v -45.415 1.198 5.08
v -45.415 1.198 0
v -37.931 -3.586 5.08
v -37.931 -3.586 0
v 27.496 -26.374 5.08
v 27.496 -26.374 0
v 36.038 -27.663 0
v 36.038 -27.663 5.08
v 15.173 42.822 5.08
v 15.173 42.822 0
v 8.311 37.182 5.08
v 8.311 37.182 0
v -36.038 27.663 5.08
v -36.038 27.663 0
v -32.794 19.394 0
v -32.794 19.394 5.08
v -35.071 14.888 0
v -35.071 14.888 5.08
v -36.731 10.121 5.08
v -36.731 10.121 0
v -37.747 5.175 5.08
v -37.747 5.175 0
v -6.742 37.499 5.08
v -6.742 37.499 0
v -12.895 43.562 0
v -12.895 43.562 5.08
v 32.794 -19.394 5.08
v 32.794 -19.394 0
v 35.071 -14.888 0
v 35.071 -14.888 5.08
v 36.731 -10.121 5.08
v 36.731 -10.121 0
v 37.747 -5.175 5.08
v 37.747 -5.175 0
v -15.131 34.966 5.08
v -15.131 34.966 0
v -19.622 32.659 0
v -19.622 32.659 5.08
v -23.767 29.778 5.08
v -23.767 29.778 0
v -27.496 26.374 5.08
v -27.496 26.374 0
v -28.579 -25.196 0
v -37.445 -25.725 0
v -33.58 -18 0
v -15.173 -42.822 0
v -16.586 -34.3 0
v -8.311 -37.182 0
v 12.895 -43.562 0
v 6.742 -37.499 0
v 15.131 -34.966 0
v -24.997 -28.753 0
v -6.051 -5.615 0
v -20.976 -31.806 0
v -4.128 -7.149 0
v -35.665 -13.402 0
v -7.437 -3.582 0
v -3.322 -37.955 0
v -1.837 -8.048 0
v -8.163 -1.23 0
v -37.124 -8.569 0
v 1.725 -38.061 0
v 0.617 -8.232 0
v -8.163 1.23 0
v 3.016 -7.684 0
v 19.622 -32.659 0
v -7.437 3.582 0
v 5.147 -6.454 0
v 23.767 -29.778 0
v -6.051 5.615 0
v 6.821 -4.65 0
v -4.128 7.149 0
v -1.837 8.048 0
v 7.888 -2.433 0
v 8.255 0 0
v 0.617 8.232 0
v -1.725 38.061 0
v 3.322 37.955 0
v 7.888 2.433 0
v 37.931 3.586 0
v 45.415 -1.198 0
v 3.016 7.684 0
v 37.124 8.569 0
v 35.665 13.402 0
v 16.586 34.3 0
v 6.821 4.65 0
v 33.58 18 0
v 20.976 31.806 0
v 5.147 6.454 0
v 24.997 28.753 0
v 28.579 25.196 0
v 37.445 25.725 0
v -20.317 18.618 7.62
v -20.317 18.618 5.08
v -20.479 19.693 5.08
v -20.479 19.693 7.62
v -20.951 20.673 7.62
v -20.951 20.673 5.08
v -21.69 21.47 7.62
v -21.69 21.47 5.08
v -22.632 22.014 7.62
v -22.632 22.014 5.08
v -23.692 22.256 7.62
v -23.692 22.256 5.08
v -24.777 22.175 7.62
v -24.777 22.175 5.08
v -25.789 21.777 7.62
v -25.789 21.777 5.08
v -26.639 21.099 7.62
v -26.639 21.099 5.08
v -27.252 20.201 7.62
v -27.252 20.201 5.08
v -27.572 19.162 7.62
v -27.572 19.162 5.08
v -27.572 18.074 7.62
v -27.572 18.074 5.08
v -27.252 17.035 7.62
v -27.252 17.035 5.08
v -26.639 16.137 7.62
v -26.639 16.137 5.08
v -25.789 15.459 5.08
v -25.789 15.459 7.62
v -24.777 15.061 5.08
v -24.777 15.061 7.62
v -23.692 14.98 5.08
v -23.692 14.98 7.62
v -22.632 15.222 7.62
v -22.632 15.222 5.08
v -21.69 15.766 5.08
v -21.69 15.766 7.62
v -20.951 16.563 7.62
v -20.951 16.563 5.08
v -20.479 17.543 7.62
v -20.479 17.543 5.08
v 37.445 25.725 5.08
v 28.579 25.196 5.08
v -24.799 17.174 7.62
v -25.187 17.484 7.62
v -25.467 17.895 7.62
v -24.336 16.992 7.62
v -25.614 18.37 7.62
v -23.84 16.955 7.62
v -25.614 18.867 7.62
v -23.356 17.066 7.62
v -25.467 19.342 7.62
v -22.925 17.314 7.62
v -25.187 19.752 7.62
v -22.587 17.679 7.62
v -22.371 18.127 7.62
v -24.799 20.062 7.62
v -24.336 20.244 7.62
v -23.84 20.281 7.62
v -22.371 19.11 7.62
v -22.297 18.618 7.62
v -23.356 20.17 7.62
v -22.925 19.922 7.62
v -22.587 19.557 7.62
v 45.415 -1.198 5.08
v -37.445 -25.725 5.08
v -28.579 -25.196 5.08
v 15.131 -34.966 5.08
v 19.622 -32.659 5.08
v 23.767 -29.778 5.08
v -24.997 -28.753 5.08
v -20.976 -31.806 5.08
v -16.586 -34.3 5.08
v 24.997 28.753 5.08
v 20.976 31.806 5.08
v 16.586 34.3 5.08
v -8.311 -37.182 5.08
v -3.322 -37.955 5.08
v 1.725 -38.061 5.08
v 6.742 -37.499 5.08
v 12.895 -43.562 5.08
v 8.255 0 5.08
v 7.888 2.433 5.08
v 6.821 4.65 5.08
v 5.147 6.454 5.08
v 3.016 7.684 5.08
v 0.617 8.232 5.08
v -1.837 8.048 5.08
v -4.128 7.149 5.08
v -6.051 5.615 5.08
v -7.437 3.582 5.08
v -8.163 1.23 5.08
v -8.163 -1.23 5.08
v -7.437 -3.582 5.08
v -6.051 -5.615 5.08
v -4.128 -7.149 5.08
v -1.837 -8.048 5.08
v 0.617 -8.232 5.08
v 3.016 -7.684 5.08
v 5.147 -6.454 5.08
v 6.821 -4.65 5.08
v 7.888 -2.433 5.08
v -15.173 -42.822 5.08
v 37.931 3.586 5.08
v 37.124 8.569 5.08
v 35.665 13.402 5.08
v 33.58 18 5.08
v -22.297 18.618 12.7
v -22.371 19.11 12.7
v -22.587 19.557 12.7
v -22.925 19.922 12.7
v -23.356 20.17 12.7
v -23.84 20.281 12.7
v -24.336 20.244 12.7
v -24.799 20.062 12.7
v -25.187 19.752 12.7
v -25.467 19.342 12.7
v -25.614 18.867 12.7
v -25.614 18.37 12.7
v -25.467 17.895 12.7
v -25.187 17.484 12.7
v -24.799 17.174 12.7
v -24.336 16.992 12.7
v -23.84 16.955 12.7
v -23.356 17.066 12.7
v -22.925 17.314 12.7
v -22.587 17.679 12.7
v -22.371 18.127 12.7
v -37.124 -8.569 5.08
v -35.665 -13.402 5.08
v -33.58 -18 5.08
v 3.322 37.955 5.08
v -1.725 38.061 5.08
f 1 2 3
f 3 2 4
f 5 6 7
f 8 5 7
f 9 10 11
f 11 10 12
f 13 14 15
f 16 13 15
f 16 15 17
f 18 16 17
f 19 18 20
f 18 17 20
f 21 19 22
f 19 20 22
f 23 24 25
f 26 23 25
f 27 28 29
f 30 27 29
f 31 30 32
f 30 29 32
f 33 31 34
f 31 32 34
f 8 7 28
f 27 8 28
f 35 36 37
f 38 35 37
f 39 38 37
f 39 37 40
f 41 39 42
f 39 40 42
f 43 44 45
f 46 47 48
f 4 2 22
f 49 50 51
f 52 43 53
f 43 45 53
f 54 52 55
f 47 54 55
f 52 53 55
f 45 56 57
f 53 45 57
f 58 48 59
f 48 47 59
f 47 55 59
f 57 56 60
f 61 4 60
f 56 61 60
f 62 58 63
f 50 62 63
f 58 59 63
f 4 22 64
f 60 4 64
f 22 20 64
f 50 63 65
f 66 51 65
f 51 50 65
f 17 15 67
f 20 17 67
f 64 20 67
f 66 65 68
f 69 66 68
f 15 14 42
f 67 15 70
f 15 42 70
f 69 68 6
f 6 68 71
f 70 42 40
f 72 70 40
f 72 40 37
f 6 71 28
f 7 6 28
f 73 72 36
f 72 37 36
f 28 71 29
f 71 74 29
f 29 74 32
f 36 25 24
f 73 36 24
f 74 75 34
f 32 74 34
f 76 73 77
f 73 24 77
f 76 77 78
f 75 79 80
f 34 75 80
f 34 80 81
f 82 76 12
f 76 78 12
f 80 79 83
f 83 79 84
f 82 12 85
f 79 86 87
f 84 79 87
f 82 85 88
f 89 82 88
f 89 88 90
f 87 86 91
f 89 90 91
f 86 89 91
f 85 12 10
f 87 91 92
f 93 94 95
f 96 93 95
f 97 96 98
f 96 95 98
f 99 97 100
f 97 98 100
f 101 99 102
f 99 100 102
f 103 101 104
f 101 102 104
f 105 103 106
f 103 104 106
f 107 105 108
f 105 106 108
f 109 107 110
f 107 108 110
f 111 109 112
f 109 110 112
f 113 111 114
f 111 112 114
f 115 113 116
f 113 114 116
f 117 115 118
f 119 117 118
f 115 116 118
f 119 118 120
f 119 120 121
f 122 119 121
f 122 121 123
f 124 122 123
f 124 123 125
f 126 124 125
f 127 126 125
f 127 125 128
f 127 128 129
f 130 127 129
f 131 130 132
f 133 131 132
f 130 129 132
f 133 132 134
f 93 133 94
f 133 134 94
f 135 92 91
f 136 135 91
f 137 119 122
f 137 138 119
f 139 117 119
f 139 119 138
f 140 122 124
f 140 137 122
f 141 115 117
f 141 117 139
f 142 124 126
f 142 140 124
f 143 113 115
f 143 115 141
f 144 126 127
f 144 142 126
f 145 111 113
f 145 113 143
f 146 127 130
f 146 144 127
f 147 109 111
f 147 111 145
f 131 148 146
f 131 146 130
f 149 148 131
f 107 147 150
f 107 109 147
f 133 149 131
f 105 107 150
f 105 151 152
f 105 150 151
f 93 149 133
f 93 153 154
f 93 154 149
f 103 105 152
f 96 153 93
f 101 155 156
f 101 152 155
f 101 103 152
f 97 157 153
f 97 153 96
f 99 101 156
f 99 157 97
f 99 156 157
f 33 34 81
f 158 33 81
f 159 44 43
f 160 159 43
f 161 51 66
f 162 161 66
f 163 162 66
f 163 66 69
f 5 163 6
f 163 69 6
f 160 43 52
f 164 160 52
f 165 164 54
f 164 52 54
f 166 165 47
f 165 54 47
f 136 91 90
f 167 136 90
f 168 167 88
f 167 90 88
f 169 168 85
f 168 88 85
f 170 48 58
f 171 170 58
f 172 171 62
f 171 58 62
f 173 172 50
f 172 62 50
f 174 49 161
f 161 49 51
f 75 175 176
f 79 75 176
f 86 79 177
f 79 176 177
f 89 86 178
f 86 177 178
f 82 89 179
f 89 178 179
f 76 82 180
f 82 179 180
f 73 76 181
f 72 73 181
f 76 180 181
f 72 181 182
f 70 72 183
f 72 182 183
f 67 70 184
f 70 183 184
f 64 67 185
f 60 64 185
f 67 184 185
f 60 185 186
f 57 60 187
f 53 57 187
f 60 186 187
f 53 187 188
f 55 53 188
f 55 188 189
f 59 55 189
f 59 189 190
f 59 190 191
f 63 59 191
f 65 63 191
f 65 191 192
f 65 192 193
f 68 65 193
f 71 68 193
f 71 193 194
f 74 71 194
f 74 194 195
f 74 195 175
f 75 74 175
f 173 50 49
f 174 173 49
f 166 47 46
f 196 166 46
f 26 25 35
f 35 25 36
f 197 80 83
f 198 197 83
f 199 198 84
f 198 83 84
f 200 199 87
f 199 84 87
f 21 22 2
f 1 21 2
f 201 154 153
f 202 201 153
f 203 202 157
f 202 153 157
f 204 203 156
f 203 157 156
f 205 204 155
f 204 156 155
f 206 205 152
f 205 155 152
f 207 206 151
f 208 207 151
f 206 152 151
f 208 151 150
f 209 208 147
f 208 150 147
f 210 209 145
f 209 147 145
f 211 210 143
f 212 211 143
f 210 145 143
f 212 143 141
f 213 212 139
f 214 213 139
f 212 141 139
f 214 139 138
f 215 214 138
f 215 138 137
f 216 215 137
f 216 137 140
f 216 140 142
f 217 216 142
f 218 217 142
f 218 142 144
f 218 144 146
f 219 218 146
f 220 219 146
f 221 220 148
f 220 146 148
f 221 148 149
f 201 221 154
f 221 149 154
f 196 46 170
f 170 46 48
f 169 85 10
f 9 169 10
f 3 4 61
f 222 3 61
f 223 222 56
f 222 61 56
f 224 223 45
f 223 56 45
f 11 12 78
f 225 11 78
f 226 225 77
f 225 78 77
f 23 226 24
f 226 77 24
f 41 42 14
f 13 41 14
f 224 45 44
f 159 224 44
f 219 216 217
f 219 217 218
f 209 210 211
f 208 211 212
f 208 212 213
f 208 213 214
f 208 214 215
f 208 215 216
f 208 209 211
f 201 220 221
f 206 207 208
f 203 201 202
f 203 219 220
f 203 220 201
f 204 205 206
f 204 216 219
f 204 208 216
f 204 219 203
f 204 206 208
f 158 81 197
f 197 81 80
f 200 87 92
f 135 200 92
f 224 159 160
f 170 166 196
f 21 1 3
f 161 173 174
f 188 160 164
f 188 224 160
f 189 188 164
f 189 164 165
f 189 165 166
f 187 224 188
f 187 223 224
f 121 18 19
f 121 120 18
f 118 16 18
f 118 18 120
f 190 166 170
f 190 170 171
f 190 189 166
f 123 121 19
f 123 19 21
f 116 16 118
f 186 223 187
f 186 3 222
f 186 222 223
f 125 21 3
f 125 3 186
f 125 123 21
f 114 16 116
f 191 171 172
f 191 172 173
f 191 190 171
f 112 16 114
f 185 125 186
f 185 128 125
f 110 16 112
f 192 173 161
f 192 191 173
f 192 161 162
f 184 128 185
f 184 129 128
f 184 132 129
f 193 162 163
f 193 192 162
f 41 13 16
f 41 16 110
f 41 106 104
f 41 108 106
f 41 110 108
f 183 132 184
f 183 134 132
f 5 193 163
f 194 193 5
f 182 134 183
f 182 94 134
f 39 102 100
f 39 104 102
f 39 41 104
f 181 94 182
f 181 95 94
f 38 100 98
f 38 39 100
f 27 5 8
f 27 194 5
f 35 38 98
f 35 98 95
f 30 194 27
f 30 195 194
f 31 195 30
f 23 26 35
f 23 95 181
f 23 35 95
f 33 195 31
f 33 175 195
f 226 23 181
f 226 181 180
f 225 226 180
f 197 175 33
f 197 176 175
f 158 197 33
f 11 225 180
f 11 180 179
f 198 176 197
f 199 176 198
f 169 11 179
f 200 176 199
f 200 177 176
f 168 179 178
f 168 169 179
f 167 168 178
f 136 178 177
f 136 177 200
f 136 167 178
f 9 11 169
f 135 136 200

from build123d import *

# Parameters (mm, degrees)
F1_DEPTH = 5.08
F2_R     = 3.6481835691
F3_DEPTH = 2.54
F4_R     = 1.6674700951
F5_DEPTH = 5.08
F6_R     = 8.255
F7_DEPTH = 25.4


with BuildPart() as f1:
    # F0 (on Top) → F1 (new body)
    with BuildSketch(Plane.XY):
        with BuildLine():
            ThreePointArc((37.7468732805, -5.1752833301), (38.0116158035, -2.5936584214), (38.1, 0))
            ThreePointArc((38.1, 0), (38.0577032994, 1.7947756344), (37.9309071088, 3.5855663298))
            Line((37.9309071088, 3.5855663298), (34.7138681986, 5.6416139149))
            Line((34.7138681986, 5.6416139149), (34.1414945044, -7.0454814325))
            Line((34.1414945044, -7.0454814325), (37.7468732805, -5.1752833301))
        make_face()
        with BuildLine():
            ThreePointArc((37.9309071088, 3.5855663298), (38.0577032994, 1.7947756344), (38.1, 0))
            ThreePointArc((38.1, 0), (38.0116158035, -2.5936584214), (37.7468732805, -5.1752833301))
            Line((37.7468732805, -5.1752833301), (45.4150282226, -1.1976239184))
            Line((45.4150282226, -1.1976239184), (37.9309071088, 3.5855663298))
        make_face()
        with BuildLine():
            Line((34.7138681986, 5.6416139149), (37.9309071088, 3.5855663298))
            ThreePointArc((37.9309071088, 3.5855663298), (36.4745263648, 11.0099467057), (33.5798171863, 18.0001632696))
            Line((33.5798171863, 18.0001632696), (31.7622793488, 14.3679527485))
            Line((31.7622793488, 14.3679527485), (24.7680518549, 24.9684613101))
            Line((24.7680518549, 24.9684613101), (28.5792054533, 25.1960118999))
            ThreePointArc((28.5792054533, 25.1960118999), (23.0370273887, 30.3464226737), (16.586412263, 34.3001593035))
            Line((16.586412263, 34.3001593035), (17.250953042, 30.2933173283))
            Line((17.250953042, 30.2933173283), (5.3616815377, 34.7582051315))
            Line((5.3616815377, 34.7582051315), (8.3112186861, 37.1824373052))
            ThreePointArc((8.3112186861, 37.1824373052), (0.8001669499, 38.0915966173), (-6.7424383934, 37.4986603029))
            Line((-6.7424383934, 37.4986603029), (-3.8496509884, 34.6476643207))
            Line((-3.8496509884, 34.6476643207), (-16.0926688901, 31.2714959807))
            Line((-16.0926688901, 31.2714959807), (-15.1313711312, 34.9664354444))
            ThreePointArc((-15.1313711312, 34.9664354444), (-21.7423300671, 31.2870753388), (-27.4959067505, 26.3739475992))
            Line((-27.4959067505, 26.3739475992), (-23.4798191861, 25.7677811734))
            Line((-23.4798191861, 25.7677811734), (-31.4001667715, 15.8401382443))
            Line((-31.4001667715, 15.8401382443), (-32.7942914728, 19.3944437094))
            ThreePointArc((-32.7942914728, 19.3944437094), (-35.9799959931, 12.5319546895), (-37.7468732805, 5.1752833301))
            Line((-37.7468732805, 5.1752833301), (-34.1414945044, 7.0454814325))
            Line((-34.1414945044, 7.0454814325), (-34.7138681986, -5.6416139149))
            Line((-34.7138681986, -5.6416139149), (-37.9309071088, -3.5855663298))
            ThreePointArc((-37.9309071088, -3.5855663298), (-36.4745263648, -11.0099467057), (-33.5798171863, -18.0001632696))
            Line((-33.5798171863, -18.0001632696), (-31.7622793488, -14.3679527485))
            Line((-31.7622793488, -14.3679527485), (-24.7680518549, -24.9684613101))
            Line((-24.7680518549, -24.9684613101), (-28.5792054533, -25.1960118999))
            ThreePointArc((-28.5792054533, -25.1960118999), (-23.0370273887, -30.3464226737), (-16.586412263, -34.3001593035))
            Line((-16.586412263, -34.3001593035), (-17.250953042, -30.2933173283))
            Line((-17.250953042, -30.2933173283), (-5.3616815377, -34.7582051315))
            Line((-5.3616815377, -34.7582051315), (-8.3112186861, -37.1824373052))
            ThreePointArc((-8.3112186861, -37.1824373052), (-0.8001669499, -38.0915966173), (6.7424383934, -37.4986603029))
            Line((6.7424383934, -37.4986603029), (3.8496509884, -34.6476643207))
            Line((3.8496509884, -34.6476643207), (16.0926688901, -31.2714959807))
            Line((16.0926688901, -31.2714959807), (15.1313711312, -34.9664354444))
            ThreePointArc((15.1313711312, -34.9664354444), (21.7423300671, -31.2870753388), (27.4959067505, -26.3739475992))
            Line((27.4959067505, -26.3739475992), (23.4798191861, -25.7677811734))
            Line((23.4798191861, -25.7677811734), (31.4001667715, -15.8401382443))
            Line((31.4001667715, -15.8401382443), (32.7942914728, -19.3944437094))
            ThreePointArc((32.7942914728, -19.3944437094), (35.9799959931, -12.5319546895), (37.7468732805, -5.1752833301))
            Line((37.7468732805, -5.1752833301), (34.1414945044, -7.0454814325))
            Line((34.1414945044, -7.0454814325), (34.7138681986, 5.6416139149))
        make_face()
        with BuildLine():
            Line((31.7622793488, 14.3679527485), (33.5798171863, 18.0001632696))
            ThreePointArc((33.5798171863, 18.0001632696), (31.2870753388, 21.7423300671), (28.5792054533, 25.1960118999))
            Line((28.5792054533, 25.1960118999), (24.7680518549, 24.9684613101))
            Line((24.7680518549, 24.9684613101), (31.7622793488, 14.3679527485))
        make_face()
        with BuildLine():
            ThreePointArc((28.5792054533, 25.1960118999), (31.2870753388, 21.7423300671), (33.5798171863, 18.0001632696))
            Line((33.5798171863, 18.0001632696), (37.4454753092, 25.7253857188))
            Line((37.4454753092, 25.7253857188), (28.5792054533, 25.1960118999))
        make_face()
        with BuildLine():
            Line((36.0375839551, -27.6631819246), (32.7942914728, -19.3944437094))
            ThreePointArc((32.7942914728, -19.3944437094), (30.3464226737, -23.0370273887), (27.4959067505, -26.3739475992))
            Line((27.4959067505, -26.3739475992), (36.0375839551, -27.6631819246))
        make_face()
        with BuildLine():
            ThreePointArc((27.4959067505, -26.3739475992), (30.3464226737, -23.0370273887), (32.7942914728, -19.3944437094))
            Line((32.7942914728, -19.3944437094), (31.4001667715, -15.8401382443))
            Line((31.4001667715, -15.8401382443), (23.4798191861, -25.7677811734))
            Line((23.4798191861, -25.7677811734), (27.4959067505, -26.3739475992))
        make_face()
        with BuildLine():
            Line((17.250953042, 30.2933173283), (16.586412263, 34.3001593035))
            ThreePointArc((16.586412263, 34.3001593035), (12.5319546895, 35.9799959931), (8.3112186861, 37.1824373052))
            Line((8.3112186861, 37.1824373052), (5.3616815377, 34.7582051315))
            Line((5.3616815377, 34.7582051315), (17.250953042, 30.2933173283))
        make_face()
        with BuildLine():
            ThreePointArc((8.3112186861, 37.1824373052), (12.5319546895, 35.9799959931), (16.586412263, 34.3001593035))
            Line((16.586412263, 34.3001593035), (15.1730235525, 42.8221723852))
            Line((15.1730235525, 42.8221723852), (8.3112186861, 37.1824373052))
        make_face()
        with BuildLine():
            Line((12.8950074891, -43.5623446725), (15.1313711312, -34.9664354444))
            ThreePointArc((15.1313711312, -34.9664354444), (11.0099467057, -36.4745263648), (6.7424383934, -37.4986603029))
            Line((6.7424383934, -37.4986603029), (12.8950074891, -43.5623446725))
        make_face()
        with BuildLine():
            ThreePointArc((6.7424383934, -37.4986603029), (11.0099467057, -36.4745263648), (15.1313711312, -34.9664354444))
            Line((15.1313711312, -34.9664354444), (16.0926688901, -31.2714959807))
            Line((16.0926688901, -31.2714959807), (3.8496509884, -34.6476643207))
            Line((3.8496509884, -34.6476643207), (6.7424383934, -37.4986603029))
        make_face()
        with BuildLine():
            Line((-3.8496509884, 34.6476643207), (-6.7424383934, 37.4986603029))
            ThreePointArc((-6.7424383934, 37.4986603029), (-11.0099467057, 36.4745263648), (-15.1313711312, 34.9664354444))
            Line((-15.1313711312, 34.9664354444), (-16.0926688901, 31.2714959807))
            Line((-16.0926688901, 31.2714959807), (-3.8496509884, 34.6476643207))
        make_face()
        with BuildLine():
            ThreePointArc((-15.1313711312, 34.9664354444), (-11.0099467057, 36.4745263648), (-6.7424383934, 37.4986603029))
            Line((-6.7424383934, 37.4986603029), (-12.8950074891, 43.5623446725))
            Line((-12.8950074891, 43.5623446725), (-15.1313711312, 34.9664354444))
        make_face()
        with BuildLine():
            Line((-15.1730235525, -42.8221723852), (-8.3112186861, -37.1824373052))
            ThreePointArc((-8.3112186861, -37.1824373052), (-12.5319546895, -35.9799959931), (-16.586412263, -34.3001593035))
            Line((-16.586412263, -34.3001593035), (-15.1730235525, -42.8221723852))
        make_face()
        with BuildLine():
            ThreePointArc((-16.586412263, -34.3001593035), (-12.5319546895, -35.9799959931), (-8.3112186861, -37.1824373052))
            Line((-8.3112186861, -37.1824373052), (-5.3616815377, -34.7582051315))
            Line((-5.3616815377, -34.7582051315), (-17.250953042, -30.2933173283))
            Line((-17.250953042, -30.2933173283), (-16.586412263, -34.3001593035))
        make_face()
        with BuildLine():
            Line((-23.4798191861, 25.7677811734), (-27.4959067505, 26.3739475992))
            ThreePointArc((-27.4959067505, 26.3739475992), (-30.3464226737, 23.0370273887), (-32.7942914728, 19.3944437094))
            Line((-32.7942914728, 19.3944437094), (-31.4001667715, 15.8401382443))
            Line((-31.4001667715, 15.8401382443), (-23.4798191861, 25.7677811734))
        make_face()
        with BuildLine():
            ThreePointArc((-32.7942914728, 19.3944437094), (-30.3464226737, 23.0370273887), (-27.4959067505, 26.3739475992))
            Line((-27.4959067505, 26.3739475992), (-36.0375839551, 27.6631819246))
            Line((-36.0375839551, 27.6631819246), (-32.7942914728, 19.3944437094))
        make_face()
        with BuildLine():
            Line((-37.4454753092, -25.7253857188), (-28.5792054533, -25.1960118999))
            ThreePointArc((-28.5792054533, -25.1960118999), (-31.2870753388, -21.7423300671), (-33.5798171863, -18.0001632696))
            Line((-33.5798171863, -18.0001632696), (-37.4454753092, -25.7253857188))
        make_face()
        with BuildLine():
            ThreePointArc((-33.5798171863, -18.0001632696), (-31.2870753388, -21.7423300671), (-28.5792054533, -25.1960118999))
            Line((-28.5792054533, -25.1960118999), (-24.7680518549, -24.9684613101))
            Line((-24.7680518549, -24.9684613101), (-31.7622793488, -14.3679527485))
            Line((-31.7622793488, -14.3679527485), (-33.5798171863, -18.0001632696))
        make_face()
        with BuildLine():
            Line((-34.1414945044, 7.0454814325), (-37.7468732805, 5.1752833301))
            ThreePointArc((-37.7468732805, 5.1752833301), (-38.0915966173, 0.8001669499), (-37.9309071088, -3.5855663298))
            Line((-37.9309071088, -3.5855663298), (-34.7138681986, -5.6416139149))
            Line((-34.7138681986, -5.6416139149), (-34.1414945044, 7.0454814325))
        make_face()
        with BuildLine():
            ThreePointArc((-37.9309071088, -3.5855663298), (-38.0915966173, 0.8001669499), (-37.7468732805, 5.1752833301))
            Line((-37.7468732805, 5.1752833301), (-45.4150282226, 1.1976239184))
            Line((-45.4150282226, 1.1976239184), (-37.9309071088, -3.5855663298))
        make_face()
    extrude(amount=F1_DEPTH)

    # F2 (on face) → F3 (join)
    with BuildSketch(Plane.XY.offset(5.08)):
        with Locations((-23.9648092538, 18.6180789024)):
            Circle(F2_R)
    extrude(amount=F3_DEPTH)

    # F4 (on face) → F5 (join)
    with BuildSketch(Plane.XY.offset(7.62)):
        with Locations((-23.9648092538, 18.6180789024)):
            Circle(F4_R)
    extrude(amount=F5_DEPTH)

    # F6 (on face) → F7 (cut)
    with BuildSketch(Plane.XY.offset(5.08)):
        Circle(F6_R)
    extrude(amount=-F7_DEPTH, mode=Mode.SUBTRACT)


solid = f1.part
